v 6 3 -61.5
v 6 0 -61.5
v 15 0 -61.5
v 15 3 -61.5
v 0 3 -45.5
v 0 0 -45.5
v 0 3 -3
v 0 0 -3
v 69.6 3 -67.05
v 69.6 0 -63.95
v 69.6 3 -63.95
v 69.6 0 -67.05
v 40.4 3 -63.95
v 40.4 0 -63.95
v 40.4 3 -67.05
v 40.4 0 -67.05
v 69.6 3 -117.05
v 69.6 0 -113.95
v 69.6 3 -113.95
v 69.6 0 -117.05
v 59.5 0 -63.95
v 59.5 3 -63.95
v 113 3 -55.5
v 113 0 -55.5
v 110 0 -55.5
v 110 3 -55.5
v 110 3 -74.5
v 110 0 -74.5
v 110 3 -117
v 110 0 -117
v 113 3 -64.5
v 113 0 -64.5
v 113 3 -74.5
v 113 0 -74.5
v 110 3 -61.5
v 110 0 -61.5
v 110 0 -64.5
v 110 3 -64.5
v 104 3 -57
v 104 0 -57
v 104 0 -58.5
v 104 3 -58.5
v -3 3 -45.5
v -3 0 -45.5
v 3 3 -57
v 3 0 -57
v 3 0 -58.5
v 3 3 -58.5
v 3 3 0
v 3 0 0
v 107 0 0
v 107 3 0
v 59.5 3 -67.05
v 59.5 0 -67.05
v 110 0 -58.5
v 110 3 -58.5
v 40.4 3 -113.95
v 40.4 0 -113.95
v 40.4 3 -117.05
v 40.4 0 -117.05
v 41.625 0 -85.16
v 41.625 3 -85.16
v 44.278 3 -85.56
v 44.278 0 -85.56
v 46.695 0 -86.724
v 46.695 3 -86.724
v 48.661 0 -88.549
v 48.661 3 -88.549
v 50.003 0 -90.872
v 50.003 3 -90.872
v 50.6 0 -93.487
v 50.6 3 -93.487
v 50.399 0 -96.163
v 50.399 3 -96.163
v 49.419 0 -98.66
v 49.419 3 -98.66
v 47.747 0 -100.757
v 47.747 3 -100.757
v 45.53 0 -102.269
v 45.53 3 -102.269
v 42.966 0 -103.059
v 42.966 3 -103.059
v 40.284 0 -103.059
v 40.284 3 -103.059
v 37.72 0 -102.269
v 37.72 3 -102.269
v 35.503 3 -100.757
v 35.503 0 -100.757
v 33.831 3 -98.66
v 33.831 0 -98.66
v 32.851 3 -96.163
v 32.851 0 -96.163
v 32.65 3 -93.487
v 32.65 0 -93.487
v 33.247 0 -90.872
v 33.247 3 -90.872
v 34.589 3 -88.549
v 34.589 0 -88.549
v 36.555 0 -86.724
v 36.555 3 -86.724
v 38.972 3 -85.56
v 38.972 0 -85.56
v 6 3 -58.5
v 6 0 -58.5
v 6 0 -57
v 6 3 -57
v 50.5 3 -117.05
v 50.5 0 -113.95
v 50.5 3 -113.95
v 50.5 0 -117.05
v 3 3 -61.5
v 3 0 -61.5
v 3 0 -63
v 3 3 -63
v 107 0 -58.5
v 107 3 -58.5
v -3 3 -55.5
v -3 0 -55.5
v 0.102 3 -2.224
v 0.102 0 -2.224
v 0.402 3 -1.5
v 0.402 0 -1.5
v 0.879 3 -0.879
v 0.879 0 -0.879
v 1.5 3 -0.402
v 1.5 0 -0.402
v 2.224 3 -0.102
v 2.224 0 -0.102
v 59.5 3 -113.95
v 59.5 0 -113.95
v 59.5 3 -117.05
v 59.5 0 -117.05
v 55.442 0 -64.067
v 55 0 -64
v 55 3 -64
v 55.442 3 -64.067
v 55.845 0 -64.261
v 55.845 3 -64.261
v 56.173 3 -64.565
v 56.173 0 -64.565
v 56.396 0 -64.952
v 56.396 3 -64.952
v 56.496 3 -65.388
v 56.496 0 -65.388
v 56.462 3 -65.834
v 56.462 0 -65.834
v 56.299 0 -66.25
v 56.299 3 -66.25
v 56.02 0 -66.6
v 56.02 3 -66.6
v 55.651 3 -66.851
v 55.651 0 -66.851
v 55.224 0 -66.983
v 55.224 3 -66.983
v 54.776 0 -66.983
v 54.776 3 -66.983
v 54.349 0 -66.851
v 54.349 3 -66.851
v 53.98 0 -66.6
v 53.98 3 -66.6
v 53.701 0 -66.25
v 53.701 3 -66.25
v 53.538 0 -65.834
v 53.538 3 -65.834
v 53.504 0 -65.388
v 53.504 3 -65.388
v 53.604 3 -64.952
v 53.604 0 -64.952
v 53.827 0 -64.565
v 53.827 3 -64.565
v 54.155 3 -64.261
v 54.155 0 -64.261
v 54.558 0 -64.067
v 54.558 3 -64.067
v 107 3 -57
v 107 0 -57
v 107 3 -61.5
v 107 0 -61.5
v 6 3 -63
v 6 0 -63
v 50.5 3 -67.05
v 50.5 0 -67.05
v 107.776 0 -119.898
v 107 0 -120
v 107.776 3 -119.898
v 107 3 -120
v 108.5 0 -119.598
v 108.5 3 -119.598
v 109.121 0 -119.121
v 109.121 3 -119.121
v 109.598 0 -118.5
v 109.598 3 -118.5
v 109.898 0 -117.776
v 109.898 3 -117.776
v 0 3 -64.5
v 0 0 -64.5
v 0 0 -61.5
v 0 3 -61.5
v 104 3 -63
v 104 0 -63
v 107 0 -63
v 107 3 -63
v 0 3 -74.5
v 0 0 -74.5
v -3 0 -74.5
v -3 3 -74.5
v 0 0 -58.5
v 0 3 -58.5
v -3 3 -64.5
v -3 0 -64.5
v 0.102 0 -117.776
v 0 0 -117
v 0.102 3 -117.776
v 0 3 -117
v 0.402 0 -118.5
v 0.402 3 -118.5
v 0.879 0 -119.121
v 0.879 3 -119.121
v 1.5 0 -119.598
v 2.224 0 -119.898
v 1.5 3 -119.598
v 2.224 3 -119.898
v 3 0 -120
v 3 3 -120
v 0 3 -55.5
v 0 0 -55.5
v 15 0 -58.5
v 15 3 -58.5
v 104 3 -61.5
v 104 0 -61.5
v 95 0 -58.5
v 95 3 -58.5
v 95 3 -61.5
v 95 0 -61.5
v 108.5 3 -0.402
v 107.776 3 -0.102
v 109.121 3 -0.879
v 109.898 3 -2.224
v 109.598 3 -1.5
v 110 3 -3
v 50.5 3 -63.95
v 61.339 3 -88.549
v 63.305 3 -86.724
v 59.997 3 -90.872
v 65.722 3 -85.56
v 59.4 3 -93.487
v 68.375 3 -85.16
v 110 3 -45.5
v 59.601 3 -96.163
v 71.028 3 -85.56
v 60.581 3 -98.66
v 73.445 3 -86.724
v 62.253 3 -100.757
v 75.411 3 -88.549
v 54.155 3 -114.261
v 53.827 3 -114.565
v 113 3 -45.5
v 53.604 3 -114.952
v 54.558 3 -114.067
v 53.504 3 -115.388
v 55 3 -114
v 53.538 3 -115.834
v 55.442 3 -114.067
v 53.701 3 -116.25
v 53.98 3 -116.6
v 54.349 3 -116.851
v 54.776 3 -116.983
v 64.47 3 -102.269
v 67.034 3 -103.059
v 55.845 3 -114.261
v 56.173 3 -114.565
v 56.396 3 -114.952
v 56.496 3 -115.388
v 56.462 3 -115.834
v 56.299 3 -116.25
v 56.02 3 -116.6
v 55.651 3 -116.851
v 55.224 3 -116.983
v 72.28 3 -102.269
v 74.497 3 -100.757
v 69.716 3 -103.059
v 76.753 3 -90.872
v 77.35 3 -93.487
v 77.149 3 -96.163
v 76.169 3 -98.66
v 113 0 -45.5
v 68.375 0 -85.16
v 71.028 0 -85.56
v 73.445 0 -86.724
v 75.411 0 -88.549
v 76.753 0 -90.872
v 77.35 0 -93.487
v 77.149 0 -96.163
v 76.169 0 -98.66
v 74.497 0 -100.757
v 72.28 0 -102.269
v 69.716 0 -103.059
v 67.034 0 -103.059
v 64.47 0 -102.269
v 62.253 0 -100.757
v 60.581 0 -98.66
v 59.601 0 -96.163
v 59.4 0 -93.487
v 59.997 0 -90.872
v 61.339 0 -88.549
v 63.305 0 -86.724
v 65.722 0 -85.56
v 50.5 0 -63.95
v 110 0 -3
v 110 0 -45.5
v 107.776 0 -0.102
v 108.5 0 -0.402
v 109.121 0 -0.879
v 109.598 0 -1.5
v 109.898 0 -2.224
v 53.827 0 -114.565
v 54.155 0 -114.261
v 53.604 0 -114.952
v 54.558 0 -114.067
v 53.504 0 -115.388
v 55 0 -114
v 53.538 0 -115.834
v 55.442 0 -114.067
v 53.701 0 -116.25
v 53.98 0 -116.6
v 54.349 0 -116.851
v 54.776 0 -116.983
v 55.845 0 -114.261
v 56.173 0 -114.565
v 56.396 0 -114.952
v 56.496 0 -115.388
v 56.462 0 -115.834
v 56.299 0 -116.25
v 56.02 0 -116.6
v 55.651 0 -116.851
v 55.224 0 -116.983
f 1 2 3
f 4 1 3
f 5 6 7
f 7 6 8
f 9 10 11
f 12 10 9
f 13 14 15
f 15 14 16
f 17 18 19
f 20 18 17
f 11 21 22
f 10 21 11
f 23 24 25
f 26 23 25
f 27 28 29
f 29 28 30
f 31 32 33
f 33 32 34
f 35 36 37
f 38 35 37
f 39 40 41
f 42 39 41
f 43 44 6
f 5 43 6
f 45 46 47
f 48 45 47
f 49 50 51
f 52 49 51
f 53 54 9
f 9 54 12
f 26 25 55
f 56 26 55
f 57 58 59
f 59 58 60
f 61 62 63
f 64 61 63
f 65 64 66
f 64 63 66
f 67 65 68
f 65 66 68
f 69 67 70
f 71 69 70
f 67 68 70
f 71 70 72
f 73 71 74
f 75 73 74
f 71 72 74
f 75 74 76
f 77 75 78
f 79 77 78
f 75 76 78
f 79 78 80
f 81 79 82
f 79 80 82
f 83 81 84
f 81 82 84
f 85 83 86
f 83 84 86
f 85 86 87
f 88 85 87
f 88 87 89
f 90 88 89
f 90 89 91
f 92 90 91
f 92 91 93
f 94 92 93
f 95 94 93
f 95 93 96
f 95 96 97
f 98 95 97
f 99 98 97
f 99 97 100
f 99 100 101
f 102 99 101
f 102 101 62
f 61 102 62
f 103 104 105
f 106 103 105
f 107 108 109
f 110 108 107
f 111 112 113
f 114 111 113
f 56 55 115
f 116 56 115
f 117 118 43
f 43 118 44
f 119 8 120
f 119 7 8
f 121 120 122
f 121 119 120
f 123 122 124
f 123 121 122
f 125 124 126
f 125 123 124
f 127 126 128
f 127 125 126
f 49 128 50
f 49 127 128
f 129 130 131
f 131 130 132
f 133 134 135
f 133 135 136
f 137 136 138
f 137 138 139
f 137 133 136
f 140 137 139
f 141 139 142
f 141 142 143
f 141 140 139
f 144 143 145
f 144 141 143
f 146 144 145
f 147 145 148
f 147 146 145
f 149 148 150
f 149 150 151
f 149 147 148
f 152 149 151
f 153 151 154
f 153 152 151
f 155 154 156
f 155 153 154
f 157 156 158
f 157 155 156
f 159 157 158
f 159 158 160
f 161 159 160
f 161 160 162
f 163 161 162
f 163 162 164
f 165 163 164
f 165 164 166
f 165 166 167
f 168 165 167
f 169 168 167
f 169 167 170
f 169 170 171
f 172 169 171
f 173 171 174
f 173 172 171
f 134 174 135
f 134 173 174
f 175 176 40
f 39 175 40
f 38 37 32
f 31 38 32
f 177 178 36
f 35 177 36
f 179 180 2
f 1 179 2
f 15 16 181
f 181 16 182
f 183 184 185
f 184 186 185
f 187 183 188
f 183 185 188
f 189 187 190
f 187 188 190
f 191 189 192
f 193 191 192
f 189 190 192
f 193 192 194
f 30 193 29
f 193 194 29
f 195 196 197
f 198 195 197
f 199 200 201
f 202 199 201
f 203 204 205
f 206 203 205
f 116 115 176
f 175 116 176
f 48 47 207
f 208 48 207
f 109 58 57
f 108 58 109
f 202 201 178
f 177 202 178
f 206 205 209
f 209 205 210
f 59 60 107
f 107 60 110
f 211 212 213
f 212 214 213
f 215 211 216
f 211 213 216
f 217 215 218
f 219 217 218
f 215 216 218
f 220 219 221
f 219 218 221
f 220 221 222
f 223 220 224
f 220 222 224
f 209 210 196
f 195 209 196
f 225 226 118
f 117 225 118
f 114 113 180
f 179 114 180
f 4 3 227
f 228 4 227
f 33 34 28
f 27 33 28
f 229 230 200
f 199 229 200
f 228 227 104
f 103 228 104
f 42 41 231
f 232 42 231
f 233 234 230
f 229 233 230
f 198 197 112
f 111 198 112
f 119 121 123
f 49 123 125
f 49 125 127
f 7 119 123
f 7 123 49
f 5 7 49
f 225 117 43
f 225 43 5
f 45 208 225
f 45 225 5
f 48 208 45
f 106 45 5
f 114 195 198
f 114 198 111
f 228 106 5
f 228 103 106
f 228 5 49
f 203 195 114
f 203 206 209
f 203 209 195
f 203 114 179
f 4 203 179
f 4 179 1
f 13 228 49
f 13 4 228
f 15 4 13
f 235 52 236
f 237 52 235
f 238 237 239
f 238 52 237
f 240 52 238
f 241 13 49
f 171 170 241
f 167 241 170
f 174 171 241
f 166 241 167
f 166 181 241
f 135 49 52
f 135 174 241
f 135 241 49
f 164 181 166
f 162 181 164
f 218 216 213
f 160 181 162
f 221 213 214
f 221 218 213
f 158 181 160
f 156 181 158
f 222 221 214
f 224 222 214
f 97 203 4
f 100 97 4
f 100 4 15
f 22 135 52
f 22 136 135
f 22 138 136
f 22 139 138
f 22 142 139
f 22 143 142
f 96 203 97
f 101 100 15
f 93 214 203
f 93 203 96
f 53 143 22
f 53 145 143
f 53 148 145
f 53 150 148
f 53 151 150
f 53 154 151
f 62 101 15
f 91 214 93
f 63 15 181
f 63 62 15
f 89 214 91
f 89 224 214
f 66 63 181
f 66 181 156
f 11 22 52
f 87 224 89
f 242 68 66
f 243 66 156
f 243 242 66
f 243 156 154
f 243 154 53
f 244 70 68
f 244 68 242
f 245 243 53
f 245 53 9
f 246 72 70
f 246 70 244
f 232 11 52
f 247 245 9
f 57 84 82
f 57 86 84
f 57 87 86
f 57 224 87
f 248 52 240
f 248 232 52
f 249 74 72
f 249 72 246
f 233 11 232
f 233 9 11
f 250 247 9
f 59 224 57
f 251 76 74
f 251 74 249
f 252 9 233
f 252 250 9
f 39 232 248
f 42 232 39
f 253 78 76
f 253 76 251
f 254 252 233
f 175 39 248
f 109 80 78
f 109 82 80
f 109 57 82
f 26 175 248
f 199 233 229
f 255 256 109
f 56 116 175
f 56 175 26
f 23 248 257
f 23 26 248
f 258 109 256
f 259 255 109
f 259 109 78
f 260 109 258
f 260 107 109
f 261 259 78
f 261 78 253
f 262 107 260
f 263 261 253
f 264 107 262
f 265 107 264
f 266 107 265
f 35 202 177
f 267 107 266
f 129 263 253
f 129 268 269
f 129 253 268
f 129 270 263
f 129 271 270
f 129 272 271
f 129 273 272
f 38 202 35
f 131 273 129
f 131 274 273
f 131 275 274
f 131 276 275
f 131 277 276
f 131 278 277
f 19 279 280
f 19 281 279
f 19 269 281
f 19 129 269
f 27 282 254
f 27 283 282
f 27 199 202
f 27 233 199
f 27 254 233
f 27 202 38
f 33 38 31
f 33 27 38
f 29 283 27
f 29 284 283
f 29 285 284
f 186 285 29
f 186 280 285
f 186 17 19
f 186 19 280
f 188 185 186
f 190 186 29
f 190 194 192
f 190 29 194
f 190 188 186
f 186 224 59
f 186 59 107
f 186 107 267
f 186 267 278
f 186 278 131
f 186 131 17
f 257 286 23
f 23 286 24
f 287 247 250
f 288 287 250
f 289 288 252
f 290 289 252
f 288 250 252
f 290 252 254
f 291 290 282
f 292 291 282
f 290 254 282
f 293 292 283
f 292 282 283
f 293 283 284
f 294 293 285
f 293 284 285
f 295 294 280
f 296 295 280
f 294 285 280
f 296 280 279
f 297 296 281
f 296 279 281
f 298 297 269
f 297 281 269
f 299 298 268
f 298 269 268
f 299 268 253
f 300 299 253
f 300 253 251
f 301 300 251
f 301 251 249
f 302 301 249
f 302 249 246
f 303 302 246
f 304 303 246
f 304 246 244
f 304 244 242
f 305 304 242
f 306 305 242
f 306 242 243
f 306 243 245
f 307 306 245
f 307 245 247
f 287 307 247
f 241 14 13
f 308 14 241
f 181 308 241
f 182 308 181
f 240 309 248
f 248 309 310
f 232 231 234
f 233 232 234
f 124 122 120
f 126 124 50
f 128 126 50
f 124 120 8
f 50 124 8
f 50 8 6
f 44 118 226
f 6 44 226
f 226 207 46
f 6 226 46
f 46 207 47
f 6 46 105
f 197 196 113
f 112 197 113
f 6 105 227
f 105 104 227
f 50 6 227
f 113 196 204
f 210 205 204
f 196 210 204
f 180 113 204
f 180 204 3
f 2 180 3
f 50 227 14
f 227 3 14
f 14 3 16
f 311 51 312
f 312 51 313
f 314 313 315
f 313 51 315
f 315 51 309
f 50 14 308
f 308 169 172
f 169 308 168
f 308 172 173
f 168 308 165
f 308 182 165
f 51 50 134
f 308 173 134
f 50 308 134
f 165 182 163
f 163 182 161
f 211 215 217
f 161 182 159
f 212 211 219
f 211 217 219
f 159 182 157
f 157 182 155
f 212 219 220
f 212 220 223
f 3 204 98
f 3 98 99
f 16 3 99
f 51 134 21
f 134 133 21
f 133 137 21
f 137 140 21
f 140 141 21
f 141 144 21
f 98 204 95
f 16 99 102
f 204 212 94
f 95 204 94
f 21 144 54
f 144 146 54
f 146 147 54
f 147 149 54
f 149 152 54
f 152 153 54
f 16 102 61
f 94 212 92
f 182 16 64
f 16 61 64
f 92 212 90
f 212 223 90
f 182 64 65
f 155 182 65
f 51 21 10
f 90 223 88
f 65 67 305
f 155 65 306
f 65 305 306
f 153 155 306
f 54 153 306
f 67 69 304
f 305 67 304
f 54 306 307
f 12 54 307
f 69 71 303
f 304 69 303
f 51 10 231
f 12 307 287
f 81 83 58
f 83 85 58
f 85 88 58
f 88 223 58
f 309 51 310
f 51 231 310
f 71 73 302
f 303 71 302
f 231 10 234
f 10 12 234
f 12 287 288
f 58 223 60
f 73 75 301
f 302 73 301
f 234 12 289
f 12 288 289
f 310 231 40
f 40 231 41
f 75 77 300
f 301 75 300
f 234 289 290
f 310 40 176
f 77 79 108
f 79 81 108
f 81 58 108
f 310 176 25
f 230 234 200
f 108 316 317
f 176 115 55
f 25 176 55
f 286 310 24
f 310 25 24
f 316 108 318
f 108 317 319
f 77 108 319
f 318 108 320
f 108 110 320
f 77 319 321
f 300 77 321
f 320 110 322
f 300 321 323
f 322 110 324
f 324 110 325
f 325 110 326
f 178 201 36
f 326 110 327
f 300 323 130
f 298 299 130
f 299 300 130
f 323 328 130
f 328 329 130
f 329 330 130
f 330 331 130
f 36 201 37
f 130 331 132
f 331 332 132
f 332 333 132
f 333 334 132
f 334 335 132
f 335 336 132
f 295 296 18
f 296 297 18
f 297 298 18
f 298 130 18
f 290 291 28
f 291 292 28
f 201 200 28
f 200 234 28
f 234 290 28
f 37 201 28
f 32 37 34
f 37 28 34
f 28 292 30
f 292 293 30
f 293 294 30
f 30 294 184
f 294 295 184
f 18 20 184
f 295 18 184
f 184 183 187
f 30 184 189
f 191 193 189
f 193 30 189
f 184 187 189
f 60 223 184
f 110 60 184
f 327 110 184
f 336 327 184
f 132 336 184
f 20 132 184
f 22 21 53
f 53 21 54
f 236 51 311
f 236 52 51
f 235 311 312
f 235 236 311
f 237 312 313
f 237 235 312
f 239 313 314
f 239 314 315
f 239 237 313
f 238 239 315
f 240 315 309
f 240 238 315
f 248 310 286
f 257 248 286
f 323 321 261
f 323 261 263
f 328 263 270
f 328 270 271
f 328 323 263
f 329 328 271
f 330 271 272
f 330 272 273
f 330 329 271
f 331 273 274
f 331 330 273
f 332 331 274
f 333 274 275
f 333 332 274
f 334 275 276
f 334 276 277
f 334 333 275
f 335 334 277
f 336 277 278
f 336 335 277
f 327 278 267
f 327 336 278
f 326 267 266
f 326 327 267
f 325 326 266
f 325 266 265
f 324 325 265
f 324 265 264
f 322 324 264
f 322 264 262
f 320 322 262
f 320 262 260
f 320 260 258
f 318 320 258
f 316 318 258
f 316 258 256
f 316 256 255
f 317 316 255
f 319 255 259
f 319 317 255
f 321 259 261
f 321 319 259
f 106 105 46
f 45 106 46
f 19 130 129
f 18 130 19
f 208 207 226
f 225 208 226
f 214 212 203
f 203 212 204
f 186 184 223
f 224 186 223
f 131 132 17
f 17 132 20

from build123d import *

# Parameters (mm, degrees)
SKETCH1_W           = 10.1
SKETCH1_H           = 3.1
SKETCH1_R           = 1.5
BOSS_EXTRUDE1_DEPTH = 3
FILLET1_R           = 3
SKETCH2_R           = 9
CUT_EXTRUDE1_DEPTH  = 10


with BuildPart() as part:
    # Sketch1 → Boss-Extrude1 (new body)
    with BuildSketch(Plane(origin=(0, 0, 0), x_dir=(1, 0, 0), z_dir=(0, 1, 0))):
        Polygon((0, 45.5), (0, 0), (110, 0), (110, 45.5), (113, 45.5), (113, 55.5), (110, 55.5), (110, 58.5), (107, 58.5), (107, 57), (104, 57), (104, 58.5), (95, 58.5), (95, 61.5), (104, 61.5), (104, 63), (107, 63), (107, 61.5), (110, 61.5), (110, 64.5), (113, 64.5), (113, 74.5), (110, 74.5), (110, 120), (0, 120), (0, 74.5), (-3, 74.5), (-3, 64.5), (0, 64.5), (0, 61.5), (3, 61.5), (3, 63), (6, 63), (6, 61.5), (15, 61.5), (15, 58.5), (6, 58.5), (6, 57), (3, 57), (3, 58.5), (0, 58.5), (0, 55.5), (-3, 55.5), (-3, 45.5), align=None)
        with Locations((45.45, 65.5)):
            Rectangle(SKETCH1_W, SKETCH1_H, mode=Mode.SUBTRACT)
        with Locations((45.45, 115.5)):
            Rectangle(SKETCH1_W, SKETCH1_H, mode=Mode.SUBTRACT)
        with Locations(Location((55, 65.5, 0), (0, 0, 270))):
            Circle(SKETCH1_R, mode=Mode.SUBTRACT)
        with Locations((64.55, 65.5)):
            Rectangle(SKETCH1_W, SKETCH1_H, mode=Mode.SUBTRACT)
        with Locations(Location((55, 115.5, 0), (0, 0, 270))):
            Circle(SKETCH1_R, mode=Mode.SUBTRACT)
        with Locations((64.55, 115.5)):
            Rectangle(SKETCH1_W, SKETCH1_H, mode=Mode.SUBTRACT)
    extrude(amount=BOSS_EXTRUDE1_DEPTH)

    # Fillet1
    fillet1_edges = [part.edges().sort_by_distance(p)[0] for p in [
        (110, 1.5, 0),
        (0, 1.5, 0),
        (0, 1.5, -120),
        (110, 1.5, -120),
    ]]
    fillet(fillet1_edges, radius=FILLET1_R)

    # Sketch2 → Cut-Extrude1 (cut)
    with BuildSketch(Plane(origin=(0, 3, 0), x_dir=(1, 0, 0), z_dir=(0, 1, 0))):
        with Locations(Location((41.625, 94.16, 0), (0, 0, 270))):
            Circle(SKETCH2_R)
        with Locations(Location((68.375, 94.16, 0), (0, 0, 270))):
            Circle(SKETCH2_R)
    extrude(amount=-CUT_EXTRUDE1_DEPTH, mode=Mode.SUBTRACT)


solid = part.part
